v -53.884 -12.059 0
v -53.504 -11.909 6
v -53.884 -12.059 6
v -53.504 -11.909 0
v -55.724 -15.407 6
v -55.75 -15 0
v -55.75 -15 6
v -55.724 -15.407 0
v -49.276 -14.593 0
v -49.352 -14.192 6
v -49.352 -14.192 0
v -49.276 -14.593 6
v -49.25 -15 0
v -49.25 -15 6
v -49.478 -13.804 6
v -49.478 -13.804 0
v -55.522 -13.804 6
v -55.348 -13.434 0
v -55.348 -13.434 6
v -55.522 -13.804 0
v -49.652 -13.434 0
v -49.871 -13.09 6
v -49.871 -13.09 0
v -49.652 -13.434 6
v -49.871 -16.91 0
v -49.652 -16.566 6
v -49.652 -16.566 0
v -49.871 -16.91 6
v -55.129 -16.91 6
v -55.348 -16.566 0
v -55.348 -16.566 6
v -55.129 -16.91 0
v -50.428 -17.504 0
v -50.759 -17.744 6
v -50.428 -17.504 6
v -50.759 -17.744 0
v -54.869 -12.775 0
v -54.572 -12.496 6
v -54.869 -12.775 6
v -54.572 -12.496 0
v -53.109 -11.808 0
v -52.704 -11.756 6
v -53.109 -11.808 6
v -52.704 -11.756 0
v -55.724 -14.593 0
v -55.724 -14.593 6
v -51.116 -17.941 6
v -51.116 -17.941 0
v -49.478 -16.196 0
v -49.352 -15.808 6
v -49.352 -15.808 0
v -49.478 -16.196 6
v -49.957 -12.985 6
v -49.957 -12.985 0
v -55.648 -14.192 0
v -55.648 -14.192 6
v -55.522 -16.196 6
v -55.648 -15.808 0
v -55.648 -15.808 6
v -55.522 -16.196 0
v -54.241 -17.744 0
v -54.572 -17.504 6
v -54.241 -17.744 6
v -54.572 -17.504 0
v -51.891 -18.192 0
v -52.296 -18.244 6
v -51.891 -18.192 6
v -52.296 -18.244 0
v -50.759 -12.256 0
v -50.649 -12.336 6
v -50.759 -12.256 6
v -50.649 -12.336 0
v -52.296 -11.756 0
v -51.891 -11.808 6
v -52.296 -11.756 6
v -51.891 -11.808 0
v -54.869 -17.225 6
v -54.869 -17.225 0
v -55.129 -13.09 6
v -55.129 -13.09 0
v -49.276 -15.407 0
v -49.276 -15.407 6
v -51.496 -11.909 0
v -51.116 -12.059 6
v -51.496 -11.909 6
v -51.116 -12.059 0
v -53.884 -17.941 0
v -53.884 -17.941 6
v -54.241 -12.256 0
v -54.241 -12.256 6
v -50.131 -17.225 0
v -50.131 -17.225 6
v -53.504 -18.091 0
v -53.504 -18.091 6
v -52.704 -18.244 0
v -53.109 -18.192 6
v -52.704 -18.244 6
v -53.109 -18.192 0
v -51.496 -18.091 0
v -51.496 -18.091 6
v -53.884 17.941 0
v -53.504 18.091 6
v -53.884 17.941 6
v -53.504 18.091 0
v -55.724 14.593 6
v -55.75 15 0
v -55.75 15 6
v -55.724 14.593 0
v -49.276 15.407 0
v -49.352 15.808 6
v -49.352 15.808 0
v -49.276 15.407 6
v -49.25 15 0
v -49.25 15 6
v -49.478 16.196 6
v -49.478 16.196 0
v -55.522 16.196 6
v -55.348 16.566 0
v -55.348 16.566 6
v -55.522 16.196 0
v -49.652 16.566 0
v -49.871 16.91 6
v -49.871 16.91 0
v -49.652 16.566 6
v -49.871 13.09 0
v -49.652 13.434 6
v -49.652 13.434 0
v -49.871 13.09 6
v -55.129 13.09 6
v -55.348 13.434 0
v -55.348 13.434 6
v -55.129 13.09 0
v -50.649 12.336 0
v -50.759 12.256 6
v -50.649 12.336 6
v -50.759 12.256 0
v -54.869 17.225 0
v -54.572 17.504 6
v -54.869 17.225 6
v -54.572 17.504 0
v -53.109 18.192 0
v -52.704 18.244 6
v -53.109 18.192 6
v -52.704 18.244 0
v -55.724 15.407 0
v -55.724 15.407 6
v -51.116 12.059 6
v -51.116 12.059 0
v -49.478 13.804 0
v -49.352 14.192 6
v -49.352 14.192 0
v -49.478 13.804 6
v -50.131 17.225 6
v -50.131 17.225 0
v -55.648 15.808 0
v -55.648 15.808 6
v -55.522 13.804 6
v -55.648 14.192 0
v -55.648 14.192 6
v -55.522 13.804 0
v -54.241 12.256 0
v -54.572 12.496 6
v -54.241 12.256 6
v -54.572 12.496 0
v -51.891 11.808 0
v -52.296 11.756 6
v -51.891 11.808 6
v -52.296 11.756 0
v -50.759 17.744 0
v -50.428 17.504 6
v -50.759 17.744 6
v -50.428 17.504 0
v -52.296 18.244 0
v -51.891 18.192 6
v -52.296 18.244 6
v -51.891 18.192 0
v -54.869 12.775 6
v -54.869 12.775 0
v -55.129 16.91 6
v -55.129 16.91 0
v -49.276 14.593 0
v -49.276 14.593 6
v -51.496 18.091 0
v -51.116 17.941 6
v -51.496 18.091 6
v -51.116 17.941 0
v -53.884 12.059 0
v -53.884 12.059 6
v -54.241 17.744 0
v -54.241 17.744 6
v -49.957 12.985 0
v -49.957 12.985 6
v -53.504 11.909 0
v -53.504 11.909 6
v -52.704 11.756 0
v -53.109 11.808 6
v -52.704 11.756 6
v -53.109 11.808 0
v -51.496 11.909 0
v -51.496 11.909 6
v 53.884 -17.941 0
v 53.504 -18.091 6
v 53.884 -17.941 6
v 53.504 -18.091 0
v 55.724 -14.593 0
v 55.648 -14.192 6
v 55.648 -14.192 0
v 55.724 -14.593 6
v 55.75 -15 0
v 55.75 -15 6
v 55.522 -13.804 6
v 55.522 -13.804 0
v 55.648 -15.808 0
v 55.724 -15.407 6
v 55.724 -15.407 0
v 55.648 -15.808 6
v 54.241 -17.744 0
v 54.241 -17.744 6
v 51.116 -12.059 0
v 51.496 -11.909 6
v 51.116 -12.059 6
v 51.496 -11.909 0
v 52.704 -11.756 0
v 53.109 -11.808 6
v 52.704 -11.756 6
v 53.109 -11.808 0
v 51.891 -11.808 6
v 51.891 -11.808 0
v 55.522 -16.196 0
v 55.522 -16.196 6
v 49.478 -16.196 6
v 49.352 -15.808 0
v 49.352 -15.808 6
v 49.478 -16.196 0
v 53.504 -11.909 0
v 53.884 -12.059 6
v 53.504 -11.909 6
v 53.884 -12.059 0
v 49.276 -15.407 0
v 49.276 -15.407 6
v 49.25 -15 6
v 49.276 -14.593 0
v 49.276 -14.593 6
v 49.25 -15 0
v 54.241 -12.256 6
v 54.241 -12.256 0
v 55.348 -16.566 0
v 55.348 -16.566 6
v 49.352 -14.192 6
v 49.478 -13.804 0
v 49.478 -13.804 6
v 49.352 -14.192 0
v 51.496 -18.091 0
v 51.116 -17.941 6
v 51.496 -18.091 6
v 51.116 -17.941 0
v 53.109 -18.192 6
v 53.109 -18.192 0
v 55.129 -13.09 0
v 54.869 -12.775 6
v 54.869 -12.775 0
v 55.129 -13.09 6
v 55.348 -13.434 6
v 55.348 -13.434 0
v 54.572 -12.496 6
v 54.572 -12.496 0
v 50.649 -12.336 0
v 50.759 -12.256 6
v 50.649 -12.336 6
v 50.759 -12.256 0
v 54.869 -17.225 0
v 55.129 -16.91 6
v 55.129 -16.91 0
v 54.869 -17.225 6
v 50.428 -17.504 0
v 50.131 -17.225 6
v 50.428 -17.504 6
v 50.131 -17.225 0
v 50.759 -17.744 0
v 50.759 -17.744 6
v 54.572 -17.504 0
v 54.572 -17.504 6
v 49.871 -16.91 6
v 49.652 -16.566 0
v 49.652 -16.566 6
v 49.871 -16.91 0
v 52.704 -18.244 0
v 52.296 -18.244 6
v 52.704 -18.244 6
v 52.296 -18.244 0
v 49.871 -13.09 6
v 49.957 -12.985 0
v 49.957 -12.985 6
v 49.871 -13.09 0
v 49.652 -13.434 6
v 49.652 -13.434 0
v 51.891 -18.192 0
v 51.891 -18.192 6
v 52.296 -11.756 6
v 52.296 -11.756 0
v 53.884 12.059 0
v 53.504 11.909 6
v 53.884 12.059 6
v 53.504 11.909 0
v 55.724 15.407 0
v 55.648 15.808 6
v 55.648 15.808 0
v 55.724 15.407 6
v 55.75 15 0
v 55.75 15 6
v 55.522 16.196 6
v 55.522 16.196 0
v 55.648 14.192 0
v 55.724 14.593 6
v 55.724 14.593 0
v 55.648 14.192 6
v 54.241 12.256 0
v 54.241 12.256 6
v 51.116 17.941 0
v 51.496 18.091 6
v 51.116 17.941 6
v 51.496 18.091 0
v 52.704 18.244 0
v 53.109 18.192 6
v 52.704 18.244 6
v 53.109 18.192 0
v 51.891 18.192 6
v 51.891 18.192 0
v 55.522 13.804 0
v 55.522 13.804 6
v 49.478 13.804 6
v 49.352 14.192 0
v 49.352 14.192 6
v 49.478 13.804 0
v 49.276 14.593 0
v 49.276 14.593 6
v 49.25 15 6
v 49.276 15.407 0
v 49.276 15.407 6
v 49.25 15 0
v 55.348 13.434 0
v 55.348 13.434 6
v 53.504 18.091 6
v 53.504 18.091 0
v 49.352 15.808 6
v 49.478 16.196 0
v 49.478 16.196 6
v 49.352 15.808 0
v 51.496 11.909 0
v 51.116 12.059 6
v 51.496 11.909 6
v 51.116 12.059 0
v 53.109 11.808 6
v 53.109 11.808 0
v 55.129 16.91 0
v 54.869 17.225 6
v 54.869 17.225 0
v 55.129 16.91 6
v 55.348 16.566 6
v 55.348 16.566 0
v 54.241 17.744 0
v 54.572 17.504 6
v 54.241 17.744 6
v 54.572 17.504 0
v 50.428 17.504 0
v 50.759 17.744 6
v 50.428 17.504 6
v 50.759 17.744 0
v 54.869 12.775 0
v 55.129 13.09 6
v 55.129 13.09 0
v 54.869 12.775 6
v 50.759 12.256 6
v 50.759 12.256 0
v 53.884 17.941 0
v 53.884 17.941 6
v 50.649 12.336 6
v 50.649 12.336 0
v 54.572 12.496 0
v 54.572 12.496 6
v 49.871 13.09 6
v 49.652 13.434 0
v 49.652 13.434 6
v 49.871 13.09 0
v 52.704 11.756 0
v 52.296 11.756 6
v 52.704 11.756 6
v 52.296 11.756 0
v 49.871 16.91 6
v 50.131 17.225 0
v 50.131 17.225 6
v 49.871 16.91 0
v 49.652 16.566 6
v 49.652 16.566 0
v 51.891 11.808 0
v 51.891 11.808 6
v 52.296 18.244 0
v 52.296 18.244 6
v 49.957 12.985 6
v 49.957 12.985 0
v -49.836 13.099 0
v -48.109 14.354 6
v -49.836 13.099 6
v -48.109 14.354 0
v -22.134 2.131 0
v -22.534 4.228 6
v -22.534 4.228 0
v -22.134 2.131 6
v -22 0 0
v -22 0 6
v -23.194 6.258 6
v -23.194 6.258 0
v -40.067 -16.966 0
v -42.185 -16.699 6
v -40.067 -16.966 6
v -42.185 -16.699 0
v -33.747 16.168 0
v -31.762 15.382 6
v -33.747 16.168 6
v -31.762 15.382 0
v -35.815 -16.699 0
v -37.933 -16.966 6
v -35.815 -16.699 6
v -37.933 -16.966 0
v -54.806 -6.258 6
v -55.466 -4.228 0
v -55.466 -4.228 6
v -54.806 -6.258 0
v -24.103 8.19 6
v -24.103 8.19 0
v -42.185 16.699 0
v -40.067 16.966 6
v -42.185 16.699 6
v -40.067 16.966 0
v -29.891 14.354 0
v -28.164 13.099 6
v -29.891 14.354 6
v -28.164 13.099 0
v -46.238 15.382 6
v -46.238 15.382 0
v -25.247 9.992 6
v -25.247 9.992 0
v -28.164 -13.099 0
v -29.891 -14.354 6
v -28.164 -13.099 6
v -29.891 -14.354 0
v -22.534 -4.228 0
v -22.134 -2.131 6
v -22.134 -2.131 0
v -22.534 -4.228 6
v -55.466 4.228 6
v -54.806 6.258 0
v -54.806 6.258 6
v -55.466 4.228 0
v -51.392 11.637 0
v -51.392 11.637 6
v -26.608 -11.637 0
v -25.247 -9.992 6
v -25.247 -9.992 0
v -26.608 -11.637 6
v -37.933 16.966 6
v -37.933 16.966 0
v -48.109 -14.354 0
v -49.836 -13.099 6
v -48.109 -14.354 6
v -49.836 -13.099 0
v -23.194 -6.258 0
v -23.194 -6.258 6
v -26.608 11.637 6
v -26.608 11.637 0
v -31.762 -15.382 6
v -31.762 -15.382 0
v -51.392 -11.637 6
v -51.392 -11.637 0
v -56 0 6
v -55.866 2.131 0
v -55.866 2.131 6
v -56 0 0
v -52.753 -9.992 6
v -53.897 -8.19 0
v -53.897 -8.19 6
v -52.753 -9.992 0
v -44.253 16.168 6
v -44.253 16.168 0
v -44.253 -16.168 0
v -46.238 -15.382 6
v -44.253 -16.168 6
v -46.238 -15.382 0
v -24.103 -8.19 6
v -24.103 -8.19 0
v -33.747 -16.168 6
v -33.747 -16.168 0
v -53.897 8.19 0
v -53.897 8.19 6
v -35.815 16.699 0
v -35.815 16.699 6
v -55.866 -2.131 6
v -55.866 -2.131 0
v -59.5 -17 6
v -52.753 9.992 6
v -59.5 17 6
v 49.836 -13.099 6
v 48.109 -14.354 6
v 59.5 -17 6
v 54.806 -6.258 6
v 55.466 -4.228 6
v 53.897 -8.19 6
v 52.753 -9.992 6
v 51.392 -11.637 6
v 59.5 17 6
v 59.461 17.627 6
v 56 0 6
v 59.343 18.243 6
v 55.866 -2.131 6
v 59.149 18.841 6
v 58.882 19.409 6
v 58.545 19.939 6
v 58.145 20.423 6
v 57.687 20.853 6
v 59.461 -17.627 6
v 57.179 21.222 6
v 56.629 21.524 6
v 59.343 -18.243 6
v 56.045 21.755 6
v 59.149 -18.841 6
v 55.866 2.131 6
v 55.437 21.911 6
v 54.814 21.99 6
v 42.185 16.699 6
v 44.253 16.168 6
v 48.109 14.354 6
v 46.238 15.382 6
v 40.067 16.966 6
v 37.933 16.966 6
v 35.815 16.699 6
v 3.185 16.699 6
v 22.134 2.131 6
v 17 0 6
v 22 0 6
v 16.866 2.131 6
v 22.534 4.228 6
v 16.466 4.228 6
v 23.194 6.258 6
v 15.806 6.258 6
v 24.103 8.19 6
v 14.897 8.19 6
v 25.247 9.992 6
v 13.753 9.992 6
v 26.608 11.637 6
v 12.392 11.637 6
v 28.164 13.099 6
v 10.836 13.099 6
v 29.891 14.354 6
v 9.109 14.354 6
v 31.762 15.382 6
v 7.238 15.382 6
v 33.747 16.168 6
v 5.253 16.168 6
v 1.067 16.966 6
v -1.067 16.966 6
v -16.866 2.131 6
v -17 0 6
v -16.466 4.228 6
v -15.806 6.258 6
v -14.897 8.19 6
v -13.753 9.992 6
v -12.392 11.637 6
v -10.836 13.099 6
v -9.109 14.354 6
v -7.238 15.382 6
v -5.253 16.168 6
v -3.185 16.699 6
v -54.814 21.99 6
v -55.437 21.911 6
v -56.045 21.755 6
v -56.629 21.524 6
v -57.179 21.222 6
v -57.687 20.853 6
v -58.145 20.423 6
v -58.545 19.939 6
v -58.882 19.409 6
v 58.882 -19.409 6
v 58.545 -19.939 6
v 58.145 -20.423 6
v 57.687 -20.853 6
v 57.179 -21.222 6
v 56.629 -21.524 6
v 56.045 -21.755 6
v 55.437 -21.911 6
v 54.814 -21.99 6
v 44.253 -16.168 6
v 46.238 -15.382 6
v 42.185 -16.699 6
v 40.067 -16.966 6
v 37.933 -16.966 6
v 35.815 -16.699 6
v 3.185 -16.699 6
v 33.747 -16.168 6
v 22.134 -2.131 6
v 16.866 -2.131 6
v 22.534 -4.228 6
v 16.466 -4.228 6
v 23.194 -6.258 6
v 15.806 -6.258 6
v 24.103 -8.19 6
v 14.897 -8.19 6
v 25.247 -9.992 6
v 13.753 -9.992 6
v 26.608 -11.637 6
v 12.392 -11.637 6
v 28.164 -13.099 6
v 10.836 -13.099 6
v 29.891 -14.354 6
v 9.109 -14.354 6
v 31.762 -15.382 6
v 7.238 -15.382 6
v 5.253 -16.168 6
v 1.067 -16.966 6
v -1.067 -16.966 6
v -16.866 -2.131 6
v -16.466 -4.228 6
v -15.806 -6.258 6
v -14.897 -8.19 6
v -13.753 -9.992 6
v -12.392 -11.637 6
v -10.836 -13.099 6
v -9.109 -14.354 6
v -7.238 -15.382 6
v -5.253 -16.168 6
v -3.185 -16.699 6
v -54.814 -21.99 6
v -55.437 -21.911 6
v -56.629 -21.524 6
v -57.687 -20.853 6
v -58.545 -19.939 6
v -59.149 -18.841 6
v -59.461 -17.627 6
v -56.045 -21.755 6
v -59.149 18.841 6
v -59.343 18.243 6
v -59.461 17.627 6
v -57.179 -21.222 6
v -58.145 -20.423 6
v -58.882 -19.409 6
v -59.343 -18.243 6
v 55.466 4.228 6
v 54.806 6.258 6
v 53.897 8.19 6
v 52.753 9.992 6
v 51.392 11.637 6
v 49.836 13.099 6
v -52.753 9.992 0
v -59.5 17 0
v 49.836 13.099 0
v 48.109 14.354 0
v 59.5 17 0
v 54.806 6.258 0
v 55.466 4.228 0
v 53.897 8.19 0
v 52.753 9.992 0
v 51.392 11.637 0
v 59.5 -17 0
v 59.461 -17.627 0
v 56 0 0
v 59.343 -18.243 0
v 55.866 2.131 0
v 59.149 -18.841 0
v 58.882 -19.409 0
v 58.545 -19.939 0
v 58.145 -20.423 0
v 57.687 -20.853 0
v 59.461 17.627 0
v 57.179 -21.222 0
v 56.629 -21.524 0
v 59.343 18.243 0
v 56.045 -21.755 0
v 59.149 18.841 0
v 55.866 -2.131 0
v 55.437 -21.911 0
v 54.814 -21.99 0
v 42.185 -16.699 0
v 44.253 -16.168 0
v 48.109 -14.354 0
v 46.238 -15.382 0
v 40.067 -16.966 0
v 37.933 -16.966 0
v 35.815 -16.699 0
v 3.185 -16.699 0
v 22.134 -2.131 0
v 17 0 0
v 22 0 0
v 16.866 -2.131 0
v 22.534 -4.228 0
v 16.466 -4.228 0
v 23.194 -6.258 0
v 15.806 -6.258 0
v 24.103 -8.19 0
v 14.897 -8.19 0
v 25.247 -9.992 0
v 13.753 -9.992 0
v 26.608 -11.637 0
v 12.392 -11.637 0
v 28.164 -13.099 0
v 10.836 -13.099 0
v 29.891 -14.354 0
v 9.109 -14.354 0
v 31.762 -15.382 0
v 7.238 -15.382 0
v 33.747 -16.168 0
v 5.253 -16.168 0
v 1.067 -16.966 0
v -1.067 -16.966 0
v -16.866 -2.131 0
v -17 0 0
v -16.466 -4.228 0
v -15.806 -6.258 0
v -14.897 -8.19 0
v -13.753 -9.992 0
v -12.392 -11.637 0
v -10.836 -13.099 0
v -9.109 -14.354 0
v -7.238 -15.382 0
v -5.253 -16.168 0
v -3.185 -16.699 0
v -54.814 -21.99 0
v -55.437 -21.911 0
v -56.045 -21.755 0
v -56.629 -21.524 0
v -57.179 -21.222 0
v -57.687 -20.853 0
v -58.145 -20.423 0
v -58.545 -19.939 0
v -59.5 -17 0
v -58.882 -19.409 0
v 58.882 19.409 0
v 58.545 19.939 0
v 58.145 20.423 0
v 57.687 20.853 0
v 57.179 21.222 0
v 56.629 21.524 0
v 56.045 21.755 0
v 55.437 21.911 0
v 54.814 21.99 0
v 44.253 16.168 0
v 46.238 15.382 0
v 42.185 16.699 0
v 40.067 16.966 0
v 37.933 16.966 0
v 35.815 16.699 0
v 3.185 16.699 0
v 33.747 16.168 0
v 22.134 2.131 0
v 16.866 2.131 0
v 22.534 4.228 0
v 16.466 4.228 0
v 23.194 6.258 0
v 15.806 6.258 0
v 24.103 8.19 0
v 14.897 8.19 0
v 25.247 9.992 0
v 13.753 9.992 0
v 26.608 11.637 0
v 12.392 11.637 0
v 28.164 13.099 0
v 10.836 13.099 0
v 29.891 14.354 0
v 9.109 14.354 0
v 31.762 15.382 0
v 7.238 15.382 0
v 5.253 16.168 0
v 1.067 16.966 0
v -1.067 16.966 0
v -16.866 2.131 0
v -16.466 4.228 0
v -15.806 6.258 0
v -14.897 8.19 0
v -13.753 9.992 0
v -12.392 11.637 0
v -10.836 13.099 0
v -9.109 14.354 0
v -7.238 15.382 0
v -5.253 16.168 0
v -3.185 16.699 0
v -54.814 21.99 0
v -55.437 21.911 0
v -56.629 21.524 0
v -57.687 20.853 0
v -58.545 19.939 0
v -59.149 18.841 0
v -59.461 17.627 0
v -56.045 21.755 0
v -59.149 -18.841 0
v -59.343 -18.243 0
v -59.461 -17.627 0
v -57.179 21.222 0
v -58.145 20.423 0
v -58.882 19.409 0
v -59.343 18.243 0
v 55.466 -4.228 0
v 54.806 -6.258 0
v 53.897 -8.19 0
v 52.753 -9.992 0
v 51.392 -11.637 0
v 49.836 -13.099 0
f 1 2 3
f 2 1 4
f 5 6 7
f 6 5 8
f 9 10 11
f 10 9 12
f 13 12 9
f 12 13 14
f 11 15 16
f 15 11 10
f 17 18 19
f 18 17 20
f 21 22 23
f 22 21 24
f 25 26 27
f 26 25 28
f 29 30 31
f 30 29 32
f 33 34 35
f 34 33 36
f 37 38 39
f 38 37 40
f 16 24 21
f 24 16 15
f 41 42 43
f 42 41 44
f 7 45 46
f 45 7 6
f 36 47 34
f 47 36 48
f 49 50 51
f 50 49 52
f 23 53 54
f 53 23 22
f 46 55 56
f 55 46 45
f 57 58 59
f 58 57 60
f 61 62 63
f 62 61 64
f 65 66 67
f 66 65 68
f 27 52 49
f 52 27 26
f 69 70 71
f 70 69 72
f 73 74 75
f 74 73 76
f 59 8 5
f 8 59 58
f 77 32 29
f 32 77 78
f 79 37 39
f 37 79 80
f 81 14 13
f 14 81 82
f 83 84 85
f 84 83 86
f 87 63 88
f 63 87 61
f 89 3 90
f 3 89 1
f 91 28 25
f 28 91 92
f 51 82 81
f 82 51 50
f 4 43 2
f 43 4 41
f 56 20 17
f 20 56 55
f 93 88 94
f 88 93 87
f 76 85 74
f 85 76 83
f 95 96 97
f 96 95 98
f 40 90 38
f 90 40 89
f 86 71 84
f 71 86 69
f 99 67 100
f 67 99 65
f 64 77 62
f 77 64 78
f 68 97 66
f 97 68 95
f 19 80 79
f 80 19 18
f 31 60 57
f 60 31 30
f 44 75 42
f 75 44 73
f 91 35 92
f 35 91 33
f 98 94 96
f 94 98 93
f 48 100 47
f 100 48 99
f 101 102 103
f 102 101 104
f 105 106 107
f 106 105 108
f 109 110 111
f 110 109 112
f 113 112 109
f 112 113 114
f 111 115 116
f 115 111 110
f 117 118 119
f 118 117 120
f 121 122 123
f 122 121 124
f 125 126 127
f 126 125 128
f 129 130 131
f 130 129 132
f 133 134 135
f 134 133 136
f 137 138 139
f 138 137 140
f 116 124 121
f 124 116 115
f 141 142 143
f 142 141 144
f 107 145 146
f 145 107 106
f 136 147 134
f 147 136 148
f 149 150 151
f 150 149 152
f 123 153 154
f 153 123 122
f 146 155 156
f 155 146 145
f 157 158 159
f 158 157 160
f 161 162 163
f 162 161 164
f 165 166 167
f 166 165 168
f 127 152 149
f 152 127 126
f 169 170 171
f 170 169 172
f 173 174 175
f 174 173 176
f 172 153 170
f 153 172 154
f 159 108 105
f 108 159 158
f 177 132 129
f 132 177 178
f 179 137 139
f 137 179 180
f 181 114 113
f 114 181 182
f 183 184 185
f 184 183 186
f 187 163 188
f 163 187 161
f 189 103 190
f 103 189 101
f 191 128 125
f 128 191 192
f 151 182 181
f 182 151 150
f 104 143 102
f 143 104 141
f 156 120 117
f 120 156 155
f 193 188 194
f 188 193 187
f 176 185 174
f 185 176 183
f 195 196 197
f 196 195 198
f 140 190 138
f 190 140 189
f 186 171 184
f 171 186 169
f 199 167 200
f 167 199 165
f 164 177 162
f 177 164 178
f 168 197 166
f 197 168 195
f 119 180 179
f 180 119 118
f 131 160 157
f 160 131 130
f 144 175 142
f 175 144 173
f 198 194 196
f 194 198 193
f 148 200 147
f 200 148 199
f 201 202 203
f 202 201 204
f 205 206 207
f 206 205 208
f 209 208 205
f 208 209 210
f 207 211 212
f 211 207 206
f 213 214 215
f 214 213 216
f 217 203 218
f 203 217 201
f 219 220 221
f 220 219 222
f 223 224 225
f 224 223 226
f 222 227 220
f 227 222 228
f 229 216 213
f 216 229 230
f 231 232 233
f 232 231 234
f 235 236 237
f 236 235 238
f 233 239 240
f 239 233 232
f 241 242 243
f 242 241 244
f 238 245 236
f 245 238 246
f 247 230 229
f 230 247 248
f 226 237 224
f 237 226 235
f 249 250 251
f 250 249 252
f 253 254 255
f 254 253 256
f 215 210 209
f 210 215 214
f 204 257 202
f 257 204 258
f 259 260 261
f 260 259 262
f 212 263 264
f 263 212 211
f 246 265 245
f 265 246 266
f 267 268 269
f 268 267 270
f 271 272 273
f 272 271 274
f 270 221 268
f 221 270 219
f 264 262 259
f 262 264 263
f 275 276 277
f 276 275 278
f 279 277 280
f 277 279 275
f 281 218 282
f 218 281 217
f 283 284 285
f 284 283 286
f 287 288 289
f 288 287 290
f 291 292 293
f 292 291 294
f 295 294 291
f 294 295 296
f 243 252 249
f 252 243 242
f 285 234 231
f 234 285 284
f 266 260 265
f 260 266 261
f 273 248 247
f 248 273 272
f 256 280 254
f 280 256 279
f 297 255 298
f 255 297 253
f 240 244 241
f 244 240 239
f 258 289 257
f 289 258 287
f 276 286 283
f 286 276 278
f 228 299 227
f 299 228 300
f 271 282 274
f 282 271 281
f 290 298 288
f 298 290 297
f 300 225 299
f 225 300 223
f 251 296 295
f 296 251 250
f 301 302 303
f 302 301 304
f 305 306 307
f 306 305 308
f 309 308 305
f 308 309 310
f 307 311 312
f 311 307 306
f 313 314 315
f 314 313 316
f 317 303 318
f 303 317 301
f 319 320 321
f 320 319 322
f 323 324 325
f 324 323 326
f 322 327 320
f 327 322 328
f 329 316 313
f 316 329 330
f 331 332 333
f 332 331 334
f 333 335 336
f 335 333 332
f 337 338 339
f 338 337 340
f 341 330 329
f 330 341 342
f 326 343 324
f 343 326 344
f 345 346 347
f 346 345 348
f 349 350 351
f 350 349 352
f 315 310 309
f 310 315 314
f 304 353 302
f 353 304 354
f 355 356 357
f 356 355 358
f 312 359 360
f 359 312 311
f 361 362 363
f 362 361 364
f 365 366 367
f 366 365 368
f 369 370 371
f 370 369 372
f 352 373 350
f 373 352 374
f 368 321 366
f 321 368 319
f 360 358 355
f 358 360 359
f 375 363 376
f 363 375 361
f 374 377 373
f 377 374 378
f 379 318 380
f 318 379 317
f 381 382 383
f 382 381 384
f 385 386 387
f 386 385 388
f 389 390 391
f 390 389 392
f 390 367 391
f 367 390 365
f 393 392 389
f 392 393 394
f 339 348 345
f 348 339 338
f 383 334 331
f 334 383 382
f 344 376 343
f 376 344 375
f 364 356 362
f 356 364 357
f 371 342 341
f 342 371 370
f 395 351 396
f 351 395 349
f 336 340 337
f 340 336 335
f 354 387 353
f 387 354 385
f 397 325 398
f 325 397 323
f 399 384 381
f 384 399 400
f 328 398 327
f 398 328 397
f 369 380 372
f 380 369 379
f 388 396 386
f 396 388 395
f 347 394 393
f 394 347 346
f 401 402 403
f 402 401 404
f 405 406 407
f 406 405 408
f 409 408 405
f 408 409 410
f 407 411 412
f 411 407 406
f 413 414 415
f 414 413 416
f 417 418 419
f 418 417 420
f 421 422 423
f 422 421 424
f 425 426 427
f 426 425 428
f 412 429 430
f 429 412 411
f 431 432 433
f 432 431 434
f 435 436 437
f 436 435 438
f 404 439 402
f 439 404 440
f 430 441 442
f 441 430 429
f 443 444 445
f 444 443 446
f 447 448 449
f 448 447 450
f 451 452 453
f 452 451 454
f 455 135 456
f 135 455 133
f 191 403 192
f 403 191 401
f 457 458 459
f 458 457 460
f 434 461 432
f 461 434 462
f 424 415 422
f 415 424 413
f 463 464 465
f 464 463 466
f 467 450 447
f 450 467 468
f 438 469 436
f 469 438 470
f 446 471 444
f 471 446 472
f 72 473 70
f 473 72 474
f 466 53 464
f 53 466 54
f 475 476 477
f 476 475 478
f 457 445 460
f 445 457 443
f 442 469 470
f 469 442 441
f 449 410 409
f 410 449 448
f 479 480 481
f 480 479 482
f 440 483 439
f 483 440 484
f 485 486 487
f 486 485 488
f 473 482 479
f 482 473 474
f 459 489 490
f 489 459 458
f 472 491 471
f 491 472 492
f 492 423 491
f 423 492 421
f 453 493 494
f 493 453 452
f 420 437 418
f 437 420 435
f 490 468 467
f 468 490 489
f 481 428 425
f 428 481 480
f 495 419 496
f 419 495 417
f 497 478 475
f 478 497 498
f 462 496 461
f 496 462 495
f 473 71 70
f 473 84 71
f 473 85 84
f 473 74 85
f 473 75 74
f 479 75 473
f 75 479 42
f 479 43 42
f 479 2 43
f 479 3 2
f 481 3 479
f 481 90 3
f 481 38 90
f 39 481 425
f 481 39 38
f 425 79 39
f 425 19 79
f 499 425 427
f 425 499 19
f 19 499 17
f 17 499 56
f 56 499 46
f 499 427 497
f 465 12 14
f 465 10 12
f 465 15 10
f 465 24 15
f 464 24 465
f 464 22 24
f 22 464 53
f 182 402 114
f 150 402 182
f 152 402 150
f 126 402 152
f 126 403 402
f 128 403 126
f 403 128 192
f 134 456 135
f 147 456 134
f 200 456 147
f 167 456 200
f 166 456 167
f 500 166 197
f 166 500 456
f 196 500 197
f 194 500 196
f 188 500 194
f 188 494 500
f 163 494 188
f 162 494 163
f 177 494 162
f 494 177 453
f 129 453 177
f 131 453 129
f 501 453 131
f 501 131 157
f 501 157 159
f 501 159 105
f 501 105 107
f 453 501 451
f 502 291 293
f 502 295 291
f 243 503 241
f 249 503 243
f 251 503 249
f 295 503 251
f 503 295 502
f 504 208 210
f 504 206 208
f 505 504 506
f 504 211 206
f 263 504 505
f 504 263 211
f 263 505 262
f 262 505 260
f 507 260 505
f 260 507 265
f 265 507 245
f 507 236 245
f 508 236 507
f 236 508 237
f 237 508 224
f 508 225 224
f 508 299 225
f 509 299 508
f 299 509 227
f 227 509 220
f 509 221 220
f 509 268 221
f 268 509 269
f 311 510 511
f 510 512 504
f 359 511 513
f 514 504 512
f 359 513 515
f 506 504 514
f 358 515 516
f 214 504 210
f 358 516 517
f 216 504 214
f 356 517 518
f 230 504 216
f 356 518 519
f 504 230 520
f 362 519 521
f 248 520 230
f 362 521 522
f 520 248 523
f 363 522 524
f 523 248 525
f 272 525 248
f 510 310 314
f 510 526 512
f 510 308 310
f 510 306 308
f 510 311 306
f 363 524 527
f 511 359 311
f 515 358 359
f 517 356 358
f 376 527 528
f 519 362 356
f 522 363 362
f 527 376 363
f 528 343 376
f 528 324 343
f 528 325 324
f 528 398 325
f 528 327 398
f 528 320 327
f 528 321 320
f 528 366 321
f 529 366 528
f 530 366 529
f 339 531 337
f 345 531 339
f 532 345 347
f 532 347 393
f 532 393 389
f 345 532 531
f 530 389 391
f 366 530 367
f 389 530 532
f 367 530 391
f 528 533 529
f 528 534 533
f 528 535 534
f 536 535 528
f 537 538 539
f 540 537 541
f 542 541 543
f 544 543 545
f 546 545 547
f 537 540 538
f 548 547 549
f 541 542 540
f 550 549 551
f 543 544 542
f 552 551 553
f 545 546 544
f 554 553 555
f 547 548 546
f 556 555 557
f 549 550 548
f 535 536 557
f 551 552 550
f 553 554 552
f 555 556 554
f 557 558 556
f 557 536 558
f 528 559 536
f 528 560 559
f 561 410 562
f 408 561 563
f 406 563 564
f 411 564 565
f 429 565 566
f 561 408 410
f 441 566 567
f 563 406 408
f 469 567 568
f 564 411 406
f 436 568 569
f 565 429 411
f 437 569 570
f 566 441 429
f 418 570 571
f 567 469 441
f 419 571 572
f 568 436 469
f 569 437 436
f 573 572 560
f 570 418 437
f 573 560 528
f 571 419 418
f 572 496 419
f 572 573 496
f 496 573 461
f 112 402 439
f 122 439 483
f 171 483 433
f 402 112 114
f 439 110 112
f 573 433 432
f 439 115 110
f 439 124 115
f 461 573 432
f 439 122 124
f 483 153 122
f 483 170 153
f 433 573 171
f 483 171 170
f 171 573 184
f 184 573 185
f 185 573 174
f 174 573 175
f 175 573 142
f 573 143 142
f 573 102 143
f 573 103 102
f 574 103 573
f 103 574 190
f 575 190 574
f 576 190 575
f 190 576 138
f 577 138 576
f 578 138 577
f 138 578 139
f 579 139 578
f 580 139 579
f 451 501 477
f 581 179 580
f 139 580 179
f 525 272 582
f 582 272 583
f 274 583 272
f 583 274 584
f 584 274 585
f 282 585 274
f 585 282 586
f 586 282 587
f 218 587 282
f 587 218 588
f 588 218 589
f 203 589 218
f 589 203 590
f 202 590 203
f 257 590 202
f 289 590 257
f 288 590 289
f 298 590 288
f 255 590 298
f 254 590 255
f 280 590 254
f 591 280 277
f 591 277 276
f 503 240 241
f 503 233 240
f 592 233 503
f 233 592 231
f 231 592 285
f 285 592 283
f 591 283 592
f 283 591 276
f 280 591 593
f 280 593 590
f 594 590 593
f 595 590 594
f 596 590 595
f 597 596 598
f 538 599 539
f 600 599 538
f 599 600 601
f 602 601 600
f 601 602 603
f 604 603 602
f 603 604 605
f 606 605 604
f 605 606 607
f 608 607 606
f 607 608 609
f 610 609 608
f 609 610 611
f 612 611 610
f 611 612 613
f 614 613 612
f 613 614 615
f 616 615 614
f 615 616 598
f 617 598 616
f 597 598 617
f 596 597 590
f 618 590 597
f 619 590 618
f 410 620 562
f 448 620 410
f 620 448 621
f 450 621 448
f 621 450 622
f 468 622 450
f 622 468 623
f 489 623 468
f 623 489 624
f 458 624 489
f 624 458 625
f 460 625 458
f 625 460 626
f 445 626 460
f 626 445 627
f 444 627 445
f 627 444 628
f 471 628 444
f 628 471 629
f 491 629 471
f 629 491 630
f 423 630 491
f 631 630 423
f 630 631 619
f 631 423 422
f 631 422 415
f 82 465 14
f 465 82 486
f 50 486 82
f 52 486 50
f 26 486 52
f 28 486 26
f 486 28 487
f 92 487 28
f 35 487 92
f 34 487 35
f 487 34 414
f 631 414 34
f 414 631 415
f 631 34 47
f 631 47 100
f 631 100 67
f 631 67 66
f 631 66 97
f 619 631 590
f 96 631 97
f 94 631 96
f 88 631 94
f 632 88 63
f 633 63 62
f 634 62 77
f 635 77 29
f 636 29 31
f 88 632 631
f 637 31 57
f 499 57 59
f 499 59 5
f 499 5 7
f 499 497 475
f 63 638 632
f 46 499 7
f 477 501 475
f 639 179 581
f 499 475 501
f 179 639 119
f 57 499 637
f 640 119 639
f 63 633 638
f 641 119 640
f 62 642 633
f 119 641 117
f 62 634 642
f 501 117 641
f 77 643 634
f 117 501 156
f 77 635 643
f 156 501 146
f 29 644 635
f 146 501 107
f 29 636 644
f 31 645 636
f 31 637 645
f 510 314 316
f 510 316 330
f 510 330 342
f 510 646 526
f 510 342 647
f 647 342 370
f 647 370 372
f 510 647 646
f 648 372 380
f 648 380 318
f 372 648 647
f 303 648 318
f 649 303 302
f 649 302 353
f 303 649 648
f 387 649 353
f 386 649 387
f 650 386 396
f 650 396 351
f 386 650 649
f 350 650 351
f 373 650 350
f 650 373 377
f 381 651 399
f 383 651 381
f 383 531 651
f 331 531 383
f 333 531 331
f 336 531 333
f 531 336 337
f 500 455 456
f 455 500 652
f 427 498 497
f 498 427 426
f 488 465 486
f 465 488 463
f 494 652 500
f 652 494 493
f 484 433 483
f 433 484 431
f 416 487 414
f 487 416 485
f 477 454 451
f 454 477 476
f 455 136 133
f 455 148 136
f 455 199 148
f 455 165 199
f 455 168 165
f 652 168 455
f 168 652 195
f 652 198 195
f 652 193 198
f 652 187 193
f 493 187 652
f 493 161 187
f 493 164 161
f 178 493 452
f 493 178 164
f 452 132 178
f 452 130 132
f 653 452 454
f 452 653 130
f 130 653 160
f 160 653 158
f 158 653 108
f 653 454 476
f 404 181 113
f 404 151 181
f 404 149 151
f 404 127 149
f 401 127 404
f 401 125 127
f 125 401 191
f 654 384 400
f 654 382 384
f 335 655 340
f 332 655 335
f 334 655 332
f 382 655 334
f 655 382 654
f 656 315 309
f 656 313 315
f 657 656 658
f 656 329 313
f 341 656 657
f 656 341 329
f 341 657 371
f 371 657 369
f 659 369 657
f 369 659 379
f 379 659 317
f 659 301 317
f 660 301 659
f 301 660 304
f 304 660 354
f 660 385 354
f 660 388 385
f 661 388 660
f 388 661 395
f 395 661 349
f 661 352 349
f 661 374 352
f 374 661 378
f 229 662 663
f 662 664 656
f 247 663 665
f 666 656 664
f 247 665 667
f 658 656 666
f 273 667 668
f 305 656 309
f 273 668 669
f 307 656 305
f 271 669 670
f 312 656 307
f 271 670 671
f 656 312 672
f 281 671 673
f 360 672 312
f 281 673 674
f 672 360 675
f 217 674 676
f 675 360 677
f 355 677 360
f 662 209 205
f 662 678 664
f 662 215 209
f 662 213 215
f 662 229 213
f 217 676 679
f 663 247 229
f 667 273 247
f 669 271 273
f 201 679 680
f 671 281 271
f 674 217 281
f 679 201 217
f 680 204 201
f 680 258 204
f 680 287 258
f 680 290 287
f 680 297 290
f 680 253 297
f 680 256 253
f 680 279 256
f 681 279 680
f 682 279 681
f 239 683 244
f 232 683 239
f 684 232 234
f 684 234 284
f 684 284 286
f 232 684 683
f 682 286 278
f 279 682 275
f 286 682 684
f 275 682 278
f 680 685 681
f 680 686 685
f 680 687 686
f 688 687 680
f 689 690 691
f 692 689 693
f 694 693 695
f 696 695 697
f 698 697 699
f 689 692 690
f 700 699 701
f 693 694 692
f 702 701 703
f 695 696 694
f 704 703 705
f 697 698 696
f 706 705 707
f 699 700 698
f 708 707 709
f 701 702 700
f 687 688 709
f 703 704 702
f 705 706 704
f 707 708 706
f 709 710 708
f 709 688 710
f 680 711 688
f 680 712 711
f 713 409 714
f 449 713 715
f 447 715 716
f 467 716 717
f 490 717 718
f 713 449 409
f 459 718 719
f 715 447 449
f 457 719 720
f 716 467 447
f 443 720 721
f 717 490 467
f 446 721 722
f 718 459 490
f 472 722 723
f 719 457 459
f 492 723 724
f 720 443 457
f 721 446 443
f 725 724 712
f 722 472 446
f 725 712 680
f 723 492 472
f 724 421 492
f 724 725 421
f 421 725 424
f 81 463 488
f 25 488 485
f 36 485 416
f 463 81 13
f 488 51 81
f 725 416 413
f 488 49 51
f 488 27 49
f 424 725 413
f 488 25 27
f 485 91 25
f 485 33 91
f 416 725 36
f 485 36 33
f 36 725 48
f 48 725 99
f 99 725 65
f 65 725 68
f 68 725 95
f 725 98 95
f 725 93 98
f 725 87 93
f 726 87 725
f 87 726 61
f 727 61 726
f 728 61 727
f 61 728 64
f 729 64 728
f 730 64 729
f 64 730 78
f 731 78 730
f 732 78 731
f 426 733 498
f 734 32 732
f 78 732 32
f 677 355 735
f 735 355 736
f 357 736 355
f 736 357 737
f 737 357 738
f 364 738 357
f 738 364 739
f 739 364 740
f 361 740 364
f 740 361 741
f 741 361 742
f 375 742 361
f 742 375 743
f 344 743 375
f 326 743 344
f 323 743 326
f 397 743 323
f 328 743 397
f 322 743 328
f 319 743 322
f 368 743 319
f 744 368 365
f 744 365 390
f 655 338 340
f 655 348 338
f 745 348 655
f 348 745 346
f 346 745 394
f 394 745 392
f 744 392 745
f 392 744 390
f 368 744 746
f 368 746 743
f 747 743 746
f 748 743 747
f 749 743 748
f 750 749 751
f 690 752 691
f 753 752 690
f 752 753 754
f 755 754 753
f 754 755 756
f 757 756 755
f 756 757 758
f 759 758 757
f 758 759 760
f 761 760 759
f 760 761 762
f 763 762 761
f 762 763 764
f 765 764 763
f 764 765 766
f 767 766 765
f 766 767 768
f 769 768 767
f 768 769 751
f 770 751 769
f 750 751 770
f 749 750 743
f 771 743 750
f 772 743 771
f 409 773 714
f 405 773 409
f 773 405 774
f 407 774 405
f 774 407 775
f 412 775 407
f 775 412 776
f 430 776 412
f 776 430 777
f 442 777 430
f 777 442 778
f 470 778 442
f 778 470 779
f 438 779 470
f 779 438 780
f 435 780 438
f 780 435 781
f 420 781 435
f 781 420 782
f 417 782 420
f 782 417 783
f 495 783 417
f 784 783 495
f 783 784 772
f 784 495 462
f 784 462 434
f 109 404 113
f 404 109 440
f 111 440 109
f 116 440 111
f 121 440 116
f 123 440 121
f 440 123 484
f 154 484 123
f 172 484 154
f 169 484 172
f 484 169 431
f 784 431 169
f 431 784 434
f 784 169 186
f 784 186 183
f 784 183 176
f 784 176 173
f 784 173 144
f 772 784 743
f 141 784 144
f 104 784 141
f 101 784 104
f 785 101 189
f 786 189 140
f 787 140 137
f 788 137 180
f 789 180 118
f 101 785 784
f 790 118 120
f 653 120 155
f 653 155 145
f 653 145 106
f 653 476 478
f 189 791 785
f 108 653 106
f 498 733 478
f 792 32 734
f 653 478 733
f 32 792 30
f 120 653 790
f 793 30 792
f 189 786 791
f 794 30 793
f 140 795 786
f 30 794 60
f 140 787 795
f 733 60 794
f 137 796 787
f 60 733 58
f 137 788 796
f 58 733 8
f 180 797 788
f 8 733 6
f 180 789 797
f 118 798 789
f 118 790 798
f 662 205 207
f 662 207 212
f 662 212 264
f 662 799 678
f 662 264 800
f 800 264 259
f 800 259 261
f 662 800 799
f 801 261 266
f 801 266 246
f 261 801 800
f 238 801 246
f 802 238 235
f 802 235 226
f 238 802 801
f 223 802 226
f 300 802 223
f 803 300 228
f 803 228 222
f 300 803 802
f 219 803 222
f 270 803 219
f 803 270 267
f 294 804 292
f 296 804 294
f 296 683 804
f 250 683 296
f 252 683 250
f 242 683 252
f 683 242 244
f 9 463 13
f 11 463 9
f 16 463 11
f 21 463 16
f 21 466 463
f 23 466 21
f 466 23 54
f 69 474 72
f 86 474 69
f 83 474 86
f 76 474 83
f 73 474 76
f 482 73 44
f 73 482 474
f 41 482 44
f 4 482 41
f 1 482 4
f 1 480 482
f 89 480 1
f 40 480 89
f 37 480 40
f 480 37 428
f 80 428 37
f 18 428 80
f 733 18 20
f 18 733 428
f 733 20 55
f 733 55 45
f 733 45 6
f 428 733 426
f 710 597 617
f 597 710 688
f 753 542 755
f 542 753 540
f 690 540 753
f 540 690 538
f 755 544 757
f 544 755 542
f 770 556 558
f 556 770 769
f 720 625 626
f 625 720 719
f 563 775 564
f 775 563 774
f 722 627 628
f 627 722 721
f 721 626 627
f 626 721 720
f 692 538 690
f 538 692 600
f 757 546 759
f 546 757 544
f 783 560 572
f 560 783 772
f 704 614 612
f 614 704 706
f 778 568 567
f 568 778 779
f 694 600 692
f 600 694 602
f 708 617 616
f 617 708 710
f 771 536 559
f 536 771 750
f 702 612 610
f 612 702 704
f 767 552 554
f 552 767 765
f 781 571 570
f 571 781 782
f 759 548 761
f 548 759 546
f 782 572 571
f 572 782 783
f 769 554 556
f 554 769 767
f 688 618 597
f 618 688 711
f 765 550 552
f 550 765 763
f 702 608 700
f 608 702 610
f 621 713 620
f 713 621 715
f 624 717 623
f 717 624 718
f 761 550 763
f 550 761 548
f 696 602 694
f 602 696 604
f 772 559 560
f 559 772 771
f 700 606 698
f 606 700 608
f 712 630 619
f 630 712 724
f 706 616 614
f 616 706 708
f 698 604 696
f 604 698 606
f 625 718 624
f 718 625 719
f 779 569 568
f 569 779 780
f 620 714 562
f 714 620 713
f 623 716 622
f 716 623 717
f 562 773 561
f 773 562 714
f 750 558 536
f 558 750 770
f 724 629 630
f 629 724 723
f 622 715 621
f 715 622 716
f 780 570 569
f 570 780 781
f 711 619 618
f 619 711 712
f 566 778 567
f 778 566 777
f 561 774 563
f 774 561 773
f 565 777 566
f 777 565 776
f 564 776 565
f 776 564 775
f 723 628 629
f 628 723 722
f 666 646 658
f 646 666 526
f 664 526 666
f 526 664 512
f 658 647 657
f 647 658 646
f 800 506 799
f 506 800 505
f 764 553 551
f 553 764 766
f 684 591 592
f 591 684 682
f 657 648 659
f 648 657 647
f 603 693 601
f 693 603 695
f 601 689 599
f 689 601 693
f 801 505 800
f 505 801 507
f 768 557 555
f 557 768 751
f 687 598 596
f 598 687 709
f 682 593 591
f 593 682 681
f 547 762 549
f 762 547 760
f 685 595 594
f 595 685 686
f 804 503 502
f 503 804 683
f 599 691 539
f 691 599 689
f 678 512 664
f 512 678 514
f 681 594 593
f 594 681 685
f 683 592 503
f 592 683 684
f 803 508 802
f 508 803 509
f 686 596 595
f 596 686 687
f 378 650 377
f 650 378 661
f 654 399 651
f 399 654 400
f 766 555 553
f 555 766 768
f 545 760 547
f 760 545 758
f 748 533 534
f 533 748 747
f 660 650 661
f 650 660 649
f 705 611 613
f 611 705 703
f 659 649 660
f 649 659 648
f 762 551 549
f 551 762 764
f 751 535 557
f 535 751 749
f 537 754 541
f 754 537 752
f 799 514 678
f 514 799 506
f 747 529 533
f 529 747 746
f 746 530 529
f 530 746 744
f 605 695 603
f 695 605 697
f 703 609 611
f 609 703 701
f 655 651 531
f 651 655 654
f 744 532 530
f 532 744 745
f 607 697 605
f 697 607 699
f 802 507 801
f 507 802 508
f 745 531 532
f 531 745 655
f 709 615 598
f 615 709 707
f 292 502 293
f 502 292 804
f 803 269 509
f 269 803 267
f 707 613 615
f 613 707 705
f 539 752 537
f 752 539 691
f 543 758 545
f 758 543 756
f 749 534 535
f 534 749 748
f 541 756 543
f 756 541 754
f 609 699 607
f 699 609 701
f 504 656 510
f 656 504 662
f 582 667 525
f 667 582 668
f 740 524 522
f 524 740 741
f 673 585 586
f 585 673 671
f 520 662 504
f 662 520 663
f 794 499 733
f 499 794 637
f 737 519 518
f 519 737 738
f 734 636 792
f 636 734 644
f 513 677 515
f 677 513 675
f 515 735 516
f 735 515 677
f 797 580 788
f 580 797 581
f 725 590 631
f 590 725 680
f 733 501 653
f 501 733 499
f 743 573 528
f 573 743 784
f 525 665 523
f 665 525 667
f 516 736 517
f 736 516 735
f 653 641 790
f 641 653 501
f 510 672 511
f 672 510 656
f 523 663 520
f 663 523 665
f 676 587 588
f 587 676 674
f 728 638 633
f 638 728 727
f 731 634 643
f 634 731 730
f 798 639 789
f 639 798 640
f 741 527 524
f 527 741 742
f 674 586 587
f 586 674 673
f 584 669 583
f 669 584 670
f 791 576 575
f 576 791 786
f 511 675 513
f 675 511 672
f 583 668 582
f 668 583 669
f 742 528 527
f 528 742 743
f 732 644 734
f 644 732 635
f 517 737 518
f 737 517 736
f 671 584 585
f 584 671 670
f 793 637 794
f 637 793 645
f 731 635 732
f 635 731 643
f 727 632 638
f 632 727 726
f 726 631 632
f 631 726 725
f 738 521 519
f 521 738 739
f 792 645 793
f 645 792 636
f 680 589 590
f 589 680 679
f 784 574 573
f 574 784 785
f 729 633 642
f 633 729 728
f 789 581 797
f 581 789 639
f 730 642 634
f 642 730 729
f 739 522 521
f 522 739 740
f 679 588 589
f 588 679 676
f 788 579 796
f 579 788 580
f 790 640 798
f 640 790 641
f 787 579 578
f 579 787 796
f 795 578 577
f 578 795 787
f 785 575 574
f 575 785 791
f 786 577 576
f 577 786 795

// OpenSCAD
$fn = 50;

difference() {
	union() {
		hull() {
			translate(v = [-54.5, 17.0, 0]) {
				cylinder(h = 6, r = 5);
			}
			translate(v = [54.5, 17.0, 0]) {
				cylinder(h = 6, r = 5);
			}
			translate(v = [-54.5, -17.0, 0]) {
				cylinder(h = 6, r = 5);
			}
			translate(v = [54.5, -17.0, 0]) {
				cylinder(h = 6, r = 5);
			}
		}
	}
	union() {
		translate(v = [-52.5, -15.0, -100.0]) {
			cylinder(h = 200, r = 3.25);
		}
		translate(v = [-52.5, 15.0, -100.0]) {
			cylinder(h = 200, r = 3.25);
		}
		translate(v = [52.5, -15.0, -100.0]) {
			cylinder(h = 200, r = 3.25);
		}
		translate(v = [52.5, 15.0, -100.0]) {
			cylinder(h = 200, r = 3.25);
		}
		translate(v = [-52.5, -15.0, -100.0]) {
			cylinder(h = 200, r = 1.8);
		}
		translate(v = [-52.5, 15.0, -100.0]) {
			cylinder(h = 200, r = 1.8);
		}
		translate(v = [52.5, -15.0, -100.0]) {
			cylinder(h = 200, r = 1.8);
		}
		translate(v = [52.5, 15.0, -100.0]) {
			cylinder(h = 200, r = 1.8);
		}
		translate(v = [-39.0, 0, 0.0]) {
			cylinder(h = 6, r = 17.0);
		}
		cylinder(h = 6, r = 17.0);
		translate(v = [39.0, 0, 0.0]) {
			cylinder(h = 6, r = 17.0);
		}
	}
}
